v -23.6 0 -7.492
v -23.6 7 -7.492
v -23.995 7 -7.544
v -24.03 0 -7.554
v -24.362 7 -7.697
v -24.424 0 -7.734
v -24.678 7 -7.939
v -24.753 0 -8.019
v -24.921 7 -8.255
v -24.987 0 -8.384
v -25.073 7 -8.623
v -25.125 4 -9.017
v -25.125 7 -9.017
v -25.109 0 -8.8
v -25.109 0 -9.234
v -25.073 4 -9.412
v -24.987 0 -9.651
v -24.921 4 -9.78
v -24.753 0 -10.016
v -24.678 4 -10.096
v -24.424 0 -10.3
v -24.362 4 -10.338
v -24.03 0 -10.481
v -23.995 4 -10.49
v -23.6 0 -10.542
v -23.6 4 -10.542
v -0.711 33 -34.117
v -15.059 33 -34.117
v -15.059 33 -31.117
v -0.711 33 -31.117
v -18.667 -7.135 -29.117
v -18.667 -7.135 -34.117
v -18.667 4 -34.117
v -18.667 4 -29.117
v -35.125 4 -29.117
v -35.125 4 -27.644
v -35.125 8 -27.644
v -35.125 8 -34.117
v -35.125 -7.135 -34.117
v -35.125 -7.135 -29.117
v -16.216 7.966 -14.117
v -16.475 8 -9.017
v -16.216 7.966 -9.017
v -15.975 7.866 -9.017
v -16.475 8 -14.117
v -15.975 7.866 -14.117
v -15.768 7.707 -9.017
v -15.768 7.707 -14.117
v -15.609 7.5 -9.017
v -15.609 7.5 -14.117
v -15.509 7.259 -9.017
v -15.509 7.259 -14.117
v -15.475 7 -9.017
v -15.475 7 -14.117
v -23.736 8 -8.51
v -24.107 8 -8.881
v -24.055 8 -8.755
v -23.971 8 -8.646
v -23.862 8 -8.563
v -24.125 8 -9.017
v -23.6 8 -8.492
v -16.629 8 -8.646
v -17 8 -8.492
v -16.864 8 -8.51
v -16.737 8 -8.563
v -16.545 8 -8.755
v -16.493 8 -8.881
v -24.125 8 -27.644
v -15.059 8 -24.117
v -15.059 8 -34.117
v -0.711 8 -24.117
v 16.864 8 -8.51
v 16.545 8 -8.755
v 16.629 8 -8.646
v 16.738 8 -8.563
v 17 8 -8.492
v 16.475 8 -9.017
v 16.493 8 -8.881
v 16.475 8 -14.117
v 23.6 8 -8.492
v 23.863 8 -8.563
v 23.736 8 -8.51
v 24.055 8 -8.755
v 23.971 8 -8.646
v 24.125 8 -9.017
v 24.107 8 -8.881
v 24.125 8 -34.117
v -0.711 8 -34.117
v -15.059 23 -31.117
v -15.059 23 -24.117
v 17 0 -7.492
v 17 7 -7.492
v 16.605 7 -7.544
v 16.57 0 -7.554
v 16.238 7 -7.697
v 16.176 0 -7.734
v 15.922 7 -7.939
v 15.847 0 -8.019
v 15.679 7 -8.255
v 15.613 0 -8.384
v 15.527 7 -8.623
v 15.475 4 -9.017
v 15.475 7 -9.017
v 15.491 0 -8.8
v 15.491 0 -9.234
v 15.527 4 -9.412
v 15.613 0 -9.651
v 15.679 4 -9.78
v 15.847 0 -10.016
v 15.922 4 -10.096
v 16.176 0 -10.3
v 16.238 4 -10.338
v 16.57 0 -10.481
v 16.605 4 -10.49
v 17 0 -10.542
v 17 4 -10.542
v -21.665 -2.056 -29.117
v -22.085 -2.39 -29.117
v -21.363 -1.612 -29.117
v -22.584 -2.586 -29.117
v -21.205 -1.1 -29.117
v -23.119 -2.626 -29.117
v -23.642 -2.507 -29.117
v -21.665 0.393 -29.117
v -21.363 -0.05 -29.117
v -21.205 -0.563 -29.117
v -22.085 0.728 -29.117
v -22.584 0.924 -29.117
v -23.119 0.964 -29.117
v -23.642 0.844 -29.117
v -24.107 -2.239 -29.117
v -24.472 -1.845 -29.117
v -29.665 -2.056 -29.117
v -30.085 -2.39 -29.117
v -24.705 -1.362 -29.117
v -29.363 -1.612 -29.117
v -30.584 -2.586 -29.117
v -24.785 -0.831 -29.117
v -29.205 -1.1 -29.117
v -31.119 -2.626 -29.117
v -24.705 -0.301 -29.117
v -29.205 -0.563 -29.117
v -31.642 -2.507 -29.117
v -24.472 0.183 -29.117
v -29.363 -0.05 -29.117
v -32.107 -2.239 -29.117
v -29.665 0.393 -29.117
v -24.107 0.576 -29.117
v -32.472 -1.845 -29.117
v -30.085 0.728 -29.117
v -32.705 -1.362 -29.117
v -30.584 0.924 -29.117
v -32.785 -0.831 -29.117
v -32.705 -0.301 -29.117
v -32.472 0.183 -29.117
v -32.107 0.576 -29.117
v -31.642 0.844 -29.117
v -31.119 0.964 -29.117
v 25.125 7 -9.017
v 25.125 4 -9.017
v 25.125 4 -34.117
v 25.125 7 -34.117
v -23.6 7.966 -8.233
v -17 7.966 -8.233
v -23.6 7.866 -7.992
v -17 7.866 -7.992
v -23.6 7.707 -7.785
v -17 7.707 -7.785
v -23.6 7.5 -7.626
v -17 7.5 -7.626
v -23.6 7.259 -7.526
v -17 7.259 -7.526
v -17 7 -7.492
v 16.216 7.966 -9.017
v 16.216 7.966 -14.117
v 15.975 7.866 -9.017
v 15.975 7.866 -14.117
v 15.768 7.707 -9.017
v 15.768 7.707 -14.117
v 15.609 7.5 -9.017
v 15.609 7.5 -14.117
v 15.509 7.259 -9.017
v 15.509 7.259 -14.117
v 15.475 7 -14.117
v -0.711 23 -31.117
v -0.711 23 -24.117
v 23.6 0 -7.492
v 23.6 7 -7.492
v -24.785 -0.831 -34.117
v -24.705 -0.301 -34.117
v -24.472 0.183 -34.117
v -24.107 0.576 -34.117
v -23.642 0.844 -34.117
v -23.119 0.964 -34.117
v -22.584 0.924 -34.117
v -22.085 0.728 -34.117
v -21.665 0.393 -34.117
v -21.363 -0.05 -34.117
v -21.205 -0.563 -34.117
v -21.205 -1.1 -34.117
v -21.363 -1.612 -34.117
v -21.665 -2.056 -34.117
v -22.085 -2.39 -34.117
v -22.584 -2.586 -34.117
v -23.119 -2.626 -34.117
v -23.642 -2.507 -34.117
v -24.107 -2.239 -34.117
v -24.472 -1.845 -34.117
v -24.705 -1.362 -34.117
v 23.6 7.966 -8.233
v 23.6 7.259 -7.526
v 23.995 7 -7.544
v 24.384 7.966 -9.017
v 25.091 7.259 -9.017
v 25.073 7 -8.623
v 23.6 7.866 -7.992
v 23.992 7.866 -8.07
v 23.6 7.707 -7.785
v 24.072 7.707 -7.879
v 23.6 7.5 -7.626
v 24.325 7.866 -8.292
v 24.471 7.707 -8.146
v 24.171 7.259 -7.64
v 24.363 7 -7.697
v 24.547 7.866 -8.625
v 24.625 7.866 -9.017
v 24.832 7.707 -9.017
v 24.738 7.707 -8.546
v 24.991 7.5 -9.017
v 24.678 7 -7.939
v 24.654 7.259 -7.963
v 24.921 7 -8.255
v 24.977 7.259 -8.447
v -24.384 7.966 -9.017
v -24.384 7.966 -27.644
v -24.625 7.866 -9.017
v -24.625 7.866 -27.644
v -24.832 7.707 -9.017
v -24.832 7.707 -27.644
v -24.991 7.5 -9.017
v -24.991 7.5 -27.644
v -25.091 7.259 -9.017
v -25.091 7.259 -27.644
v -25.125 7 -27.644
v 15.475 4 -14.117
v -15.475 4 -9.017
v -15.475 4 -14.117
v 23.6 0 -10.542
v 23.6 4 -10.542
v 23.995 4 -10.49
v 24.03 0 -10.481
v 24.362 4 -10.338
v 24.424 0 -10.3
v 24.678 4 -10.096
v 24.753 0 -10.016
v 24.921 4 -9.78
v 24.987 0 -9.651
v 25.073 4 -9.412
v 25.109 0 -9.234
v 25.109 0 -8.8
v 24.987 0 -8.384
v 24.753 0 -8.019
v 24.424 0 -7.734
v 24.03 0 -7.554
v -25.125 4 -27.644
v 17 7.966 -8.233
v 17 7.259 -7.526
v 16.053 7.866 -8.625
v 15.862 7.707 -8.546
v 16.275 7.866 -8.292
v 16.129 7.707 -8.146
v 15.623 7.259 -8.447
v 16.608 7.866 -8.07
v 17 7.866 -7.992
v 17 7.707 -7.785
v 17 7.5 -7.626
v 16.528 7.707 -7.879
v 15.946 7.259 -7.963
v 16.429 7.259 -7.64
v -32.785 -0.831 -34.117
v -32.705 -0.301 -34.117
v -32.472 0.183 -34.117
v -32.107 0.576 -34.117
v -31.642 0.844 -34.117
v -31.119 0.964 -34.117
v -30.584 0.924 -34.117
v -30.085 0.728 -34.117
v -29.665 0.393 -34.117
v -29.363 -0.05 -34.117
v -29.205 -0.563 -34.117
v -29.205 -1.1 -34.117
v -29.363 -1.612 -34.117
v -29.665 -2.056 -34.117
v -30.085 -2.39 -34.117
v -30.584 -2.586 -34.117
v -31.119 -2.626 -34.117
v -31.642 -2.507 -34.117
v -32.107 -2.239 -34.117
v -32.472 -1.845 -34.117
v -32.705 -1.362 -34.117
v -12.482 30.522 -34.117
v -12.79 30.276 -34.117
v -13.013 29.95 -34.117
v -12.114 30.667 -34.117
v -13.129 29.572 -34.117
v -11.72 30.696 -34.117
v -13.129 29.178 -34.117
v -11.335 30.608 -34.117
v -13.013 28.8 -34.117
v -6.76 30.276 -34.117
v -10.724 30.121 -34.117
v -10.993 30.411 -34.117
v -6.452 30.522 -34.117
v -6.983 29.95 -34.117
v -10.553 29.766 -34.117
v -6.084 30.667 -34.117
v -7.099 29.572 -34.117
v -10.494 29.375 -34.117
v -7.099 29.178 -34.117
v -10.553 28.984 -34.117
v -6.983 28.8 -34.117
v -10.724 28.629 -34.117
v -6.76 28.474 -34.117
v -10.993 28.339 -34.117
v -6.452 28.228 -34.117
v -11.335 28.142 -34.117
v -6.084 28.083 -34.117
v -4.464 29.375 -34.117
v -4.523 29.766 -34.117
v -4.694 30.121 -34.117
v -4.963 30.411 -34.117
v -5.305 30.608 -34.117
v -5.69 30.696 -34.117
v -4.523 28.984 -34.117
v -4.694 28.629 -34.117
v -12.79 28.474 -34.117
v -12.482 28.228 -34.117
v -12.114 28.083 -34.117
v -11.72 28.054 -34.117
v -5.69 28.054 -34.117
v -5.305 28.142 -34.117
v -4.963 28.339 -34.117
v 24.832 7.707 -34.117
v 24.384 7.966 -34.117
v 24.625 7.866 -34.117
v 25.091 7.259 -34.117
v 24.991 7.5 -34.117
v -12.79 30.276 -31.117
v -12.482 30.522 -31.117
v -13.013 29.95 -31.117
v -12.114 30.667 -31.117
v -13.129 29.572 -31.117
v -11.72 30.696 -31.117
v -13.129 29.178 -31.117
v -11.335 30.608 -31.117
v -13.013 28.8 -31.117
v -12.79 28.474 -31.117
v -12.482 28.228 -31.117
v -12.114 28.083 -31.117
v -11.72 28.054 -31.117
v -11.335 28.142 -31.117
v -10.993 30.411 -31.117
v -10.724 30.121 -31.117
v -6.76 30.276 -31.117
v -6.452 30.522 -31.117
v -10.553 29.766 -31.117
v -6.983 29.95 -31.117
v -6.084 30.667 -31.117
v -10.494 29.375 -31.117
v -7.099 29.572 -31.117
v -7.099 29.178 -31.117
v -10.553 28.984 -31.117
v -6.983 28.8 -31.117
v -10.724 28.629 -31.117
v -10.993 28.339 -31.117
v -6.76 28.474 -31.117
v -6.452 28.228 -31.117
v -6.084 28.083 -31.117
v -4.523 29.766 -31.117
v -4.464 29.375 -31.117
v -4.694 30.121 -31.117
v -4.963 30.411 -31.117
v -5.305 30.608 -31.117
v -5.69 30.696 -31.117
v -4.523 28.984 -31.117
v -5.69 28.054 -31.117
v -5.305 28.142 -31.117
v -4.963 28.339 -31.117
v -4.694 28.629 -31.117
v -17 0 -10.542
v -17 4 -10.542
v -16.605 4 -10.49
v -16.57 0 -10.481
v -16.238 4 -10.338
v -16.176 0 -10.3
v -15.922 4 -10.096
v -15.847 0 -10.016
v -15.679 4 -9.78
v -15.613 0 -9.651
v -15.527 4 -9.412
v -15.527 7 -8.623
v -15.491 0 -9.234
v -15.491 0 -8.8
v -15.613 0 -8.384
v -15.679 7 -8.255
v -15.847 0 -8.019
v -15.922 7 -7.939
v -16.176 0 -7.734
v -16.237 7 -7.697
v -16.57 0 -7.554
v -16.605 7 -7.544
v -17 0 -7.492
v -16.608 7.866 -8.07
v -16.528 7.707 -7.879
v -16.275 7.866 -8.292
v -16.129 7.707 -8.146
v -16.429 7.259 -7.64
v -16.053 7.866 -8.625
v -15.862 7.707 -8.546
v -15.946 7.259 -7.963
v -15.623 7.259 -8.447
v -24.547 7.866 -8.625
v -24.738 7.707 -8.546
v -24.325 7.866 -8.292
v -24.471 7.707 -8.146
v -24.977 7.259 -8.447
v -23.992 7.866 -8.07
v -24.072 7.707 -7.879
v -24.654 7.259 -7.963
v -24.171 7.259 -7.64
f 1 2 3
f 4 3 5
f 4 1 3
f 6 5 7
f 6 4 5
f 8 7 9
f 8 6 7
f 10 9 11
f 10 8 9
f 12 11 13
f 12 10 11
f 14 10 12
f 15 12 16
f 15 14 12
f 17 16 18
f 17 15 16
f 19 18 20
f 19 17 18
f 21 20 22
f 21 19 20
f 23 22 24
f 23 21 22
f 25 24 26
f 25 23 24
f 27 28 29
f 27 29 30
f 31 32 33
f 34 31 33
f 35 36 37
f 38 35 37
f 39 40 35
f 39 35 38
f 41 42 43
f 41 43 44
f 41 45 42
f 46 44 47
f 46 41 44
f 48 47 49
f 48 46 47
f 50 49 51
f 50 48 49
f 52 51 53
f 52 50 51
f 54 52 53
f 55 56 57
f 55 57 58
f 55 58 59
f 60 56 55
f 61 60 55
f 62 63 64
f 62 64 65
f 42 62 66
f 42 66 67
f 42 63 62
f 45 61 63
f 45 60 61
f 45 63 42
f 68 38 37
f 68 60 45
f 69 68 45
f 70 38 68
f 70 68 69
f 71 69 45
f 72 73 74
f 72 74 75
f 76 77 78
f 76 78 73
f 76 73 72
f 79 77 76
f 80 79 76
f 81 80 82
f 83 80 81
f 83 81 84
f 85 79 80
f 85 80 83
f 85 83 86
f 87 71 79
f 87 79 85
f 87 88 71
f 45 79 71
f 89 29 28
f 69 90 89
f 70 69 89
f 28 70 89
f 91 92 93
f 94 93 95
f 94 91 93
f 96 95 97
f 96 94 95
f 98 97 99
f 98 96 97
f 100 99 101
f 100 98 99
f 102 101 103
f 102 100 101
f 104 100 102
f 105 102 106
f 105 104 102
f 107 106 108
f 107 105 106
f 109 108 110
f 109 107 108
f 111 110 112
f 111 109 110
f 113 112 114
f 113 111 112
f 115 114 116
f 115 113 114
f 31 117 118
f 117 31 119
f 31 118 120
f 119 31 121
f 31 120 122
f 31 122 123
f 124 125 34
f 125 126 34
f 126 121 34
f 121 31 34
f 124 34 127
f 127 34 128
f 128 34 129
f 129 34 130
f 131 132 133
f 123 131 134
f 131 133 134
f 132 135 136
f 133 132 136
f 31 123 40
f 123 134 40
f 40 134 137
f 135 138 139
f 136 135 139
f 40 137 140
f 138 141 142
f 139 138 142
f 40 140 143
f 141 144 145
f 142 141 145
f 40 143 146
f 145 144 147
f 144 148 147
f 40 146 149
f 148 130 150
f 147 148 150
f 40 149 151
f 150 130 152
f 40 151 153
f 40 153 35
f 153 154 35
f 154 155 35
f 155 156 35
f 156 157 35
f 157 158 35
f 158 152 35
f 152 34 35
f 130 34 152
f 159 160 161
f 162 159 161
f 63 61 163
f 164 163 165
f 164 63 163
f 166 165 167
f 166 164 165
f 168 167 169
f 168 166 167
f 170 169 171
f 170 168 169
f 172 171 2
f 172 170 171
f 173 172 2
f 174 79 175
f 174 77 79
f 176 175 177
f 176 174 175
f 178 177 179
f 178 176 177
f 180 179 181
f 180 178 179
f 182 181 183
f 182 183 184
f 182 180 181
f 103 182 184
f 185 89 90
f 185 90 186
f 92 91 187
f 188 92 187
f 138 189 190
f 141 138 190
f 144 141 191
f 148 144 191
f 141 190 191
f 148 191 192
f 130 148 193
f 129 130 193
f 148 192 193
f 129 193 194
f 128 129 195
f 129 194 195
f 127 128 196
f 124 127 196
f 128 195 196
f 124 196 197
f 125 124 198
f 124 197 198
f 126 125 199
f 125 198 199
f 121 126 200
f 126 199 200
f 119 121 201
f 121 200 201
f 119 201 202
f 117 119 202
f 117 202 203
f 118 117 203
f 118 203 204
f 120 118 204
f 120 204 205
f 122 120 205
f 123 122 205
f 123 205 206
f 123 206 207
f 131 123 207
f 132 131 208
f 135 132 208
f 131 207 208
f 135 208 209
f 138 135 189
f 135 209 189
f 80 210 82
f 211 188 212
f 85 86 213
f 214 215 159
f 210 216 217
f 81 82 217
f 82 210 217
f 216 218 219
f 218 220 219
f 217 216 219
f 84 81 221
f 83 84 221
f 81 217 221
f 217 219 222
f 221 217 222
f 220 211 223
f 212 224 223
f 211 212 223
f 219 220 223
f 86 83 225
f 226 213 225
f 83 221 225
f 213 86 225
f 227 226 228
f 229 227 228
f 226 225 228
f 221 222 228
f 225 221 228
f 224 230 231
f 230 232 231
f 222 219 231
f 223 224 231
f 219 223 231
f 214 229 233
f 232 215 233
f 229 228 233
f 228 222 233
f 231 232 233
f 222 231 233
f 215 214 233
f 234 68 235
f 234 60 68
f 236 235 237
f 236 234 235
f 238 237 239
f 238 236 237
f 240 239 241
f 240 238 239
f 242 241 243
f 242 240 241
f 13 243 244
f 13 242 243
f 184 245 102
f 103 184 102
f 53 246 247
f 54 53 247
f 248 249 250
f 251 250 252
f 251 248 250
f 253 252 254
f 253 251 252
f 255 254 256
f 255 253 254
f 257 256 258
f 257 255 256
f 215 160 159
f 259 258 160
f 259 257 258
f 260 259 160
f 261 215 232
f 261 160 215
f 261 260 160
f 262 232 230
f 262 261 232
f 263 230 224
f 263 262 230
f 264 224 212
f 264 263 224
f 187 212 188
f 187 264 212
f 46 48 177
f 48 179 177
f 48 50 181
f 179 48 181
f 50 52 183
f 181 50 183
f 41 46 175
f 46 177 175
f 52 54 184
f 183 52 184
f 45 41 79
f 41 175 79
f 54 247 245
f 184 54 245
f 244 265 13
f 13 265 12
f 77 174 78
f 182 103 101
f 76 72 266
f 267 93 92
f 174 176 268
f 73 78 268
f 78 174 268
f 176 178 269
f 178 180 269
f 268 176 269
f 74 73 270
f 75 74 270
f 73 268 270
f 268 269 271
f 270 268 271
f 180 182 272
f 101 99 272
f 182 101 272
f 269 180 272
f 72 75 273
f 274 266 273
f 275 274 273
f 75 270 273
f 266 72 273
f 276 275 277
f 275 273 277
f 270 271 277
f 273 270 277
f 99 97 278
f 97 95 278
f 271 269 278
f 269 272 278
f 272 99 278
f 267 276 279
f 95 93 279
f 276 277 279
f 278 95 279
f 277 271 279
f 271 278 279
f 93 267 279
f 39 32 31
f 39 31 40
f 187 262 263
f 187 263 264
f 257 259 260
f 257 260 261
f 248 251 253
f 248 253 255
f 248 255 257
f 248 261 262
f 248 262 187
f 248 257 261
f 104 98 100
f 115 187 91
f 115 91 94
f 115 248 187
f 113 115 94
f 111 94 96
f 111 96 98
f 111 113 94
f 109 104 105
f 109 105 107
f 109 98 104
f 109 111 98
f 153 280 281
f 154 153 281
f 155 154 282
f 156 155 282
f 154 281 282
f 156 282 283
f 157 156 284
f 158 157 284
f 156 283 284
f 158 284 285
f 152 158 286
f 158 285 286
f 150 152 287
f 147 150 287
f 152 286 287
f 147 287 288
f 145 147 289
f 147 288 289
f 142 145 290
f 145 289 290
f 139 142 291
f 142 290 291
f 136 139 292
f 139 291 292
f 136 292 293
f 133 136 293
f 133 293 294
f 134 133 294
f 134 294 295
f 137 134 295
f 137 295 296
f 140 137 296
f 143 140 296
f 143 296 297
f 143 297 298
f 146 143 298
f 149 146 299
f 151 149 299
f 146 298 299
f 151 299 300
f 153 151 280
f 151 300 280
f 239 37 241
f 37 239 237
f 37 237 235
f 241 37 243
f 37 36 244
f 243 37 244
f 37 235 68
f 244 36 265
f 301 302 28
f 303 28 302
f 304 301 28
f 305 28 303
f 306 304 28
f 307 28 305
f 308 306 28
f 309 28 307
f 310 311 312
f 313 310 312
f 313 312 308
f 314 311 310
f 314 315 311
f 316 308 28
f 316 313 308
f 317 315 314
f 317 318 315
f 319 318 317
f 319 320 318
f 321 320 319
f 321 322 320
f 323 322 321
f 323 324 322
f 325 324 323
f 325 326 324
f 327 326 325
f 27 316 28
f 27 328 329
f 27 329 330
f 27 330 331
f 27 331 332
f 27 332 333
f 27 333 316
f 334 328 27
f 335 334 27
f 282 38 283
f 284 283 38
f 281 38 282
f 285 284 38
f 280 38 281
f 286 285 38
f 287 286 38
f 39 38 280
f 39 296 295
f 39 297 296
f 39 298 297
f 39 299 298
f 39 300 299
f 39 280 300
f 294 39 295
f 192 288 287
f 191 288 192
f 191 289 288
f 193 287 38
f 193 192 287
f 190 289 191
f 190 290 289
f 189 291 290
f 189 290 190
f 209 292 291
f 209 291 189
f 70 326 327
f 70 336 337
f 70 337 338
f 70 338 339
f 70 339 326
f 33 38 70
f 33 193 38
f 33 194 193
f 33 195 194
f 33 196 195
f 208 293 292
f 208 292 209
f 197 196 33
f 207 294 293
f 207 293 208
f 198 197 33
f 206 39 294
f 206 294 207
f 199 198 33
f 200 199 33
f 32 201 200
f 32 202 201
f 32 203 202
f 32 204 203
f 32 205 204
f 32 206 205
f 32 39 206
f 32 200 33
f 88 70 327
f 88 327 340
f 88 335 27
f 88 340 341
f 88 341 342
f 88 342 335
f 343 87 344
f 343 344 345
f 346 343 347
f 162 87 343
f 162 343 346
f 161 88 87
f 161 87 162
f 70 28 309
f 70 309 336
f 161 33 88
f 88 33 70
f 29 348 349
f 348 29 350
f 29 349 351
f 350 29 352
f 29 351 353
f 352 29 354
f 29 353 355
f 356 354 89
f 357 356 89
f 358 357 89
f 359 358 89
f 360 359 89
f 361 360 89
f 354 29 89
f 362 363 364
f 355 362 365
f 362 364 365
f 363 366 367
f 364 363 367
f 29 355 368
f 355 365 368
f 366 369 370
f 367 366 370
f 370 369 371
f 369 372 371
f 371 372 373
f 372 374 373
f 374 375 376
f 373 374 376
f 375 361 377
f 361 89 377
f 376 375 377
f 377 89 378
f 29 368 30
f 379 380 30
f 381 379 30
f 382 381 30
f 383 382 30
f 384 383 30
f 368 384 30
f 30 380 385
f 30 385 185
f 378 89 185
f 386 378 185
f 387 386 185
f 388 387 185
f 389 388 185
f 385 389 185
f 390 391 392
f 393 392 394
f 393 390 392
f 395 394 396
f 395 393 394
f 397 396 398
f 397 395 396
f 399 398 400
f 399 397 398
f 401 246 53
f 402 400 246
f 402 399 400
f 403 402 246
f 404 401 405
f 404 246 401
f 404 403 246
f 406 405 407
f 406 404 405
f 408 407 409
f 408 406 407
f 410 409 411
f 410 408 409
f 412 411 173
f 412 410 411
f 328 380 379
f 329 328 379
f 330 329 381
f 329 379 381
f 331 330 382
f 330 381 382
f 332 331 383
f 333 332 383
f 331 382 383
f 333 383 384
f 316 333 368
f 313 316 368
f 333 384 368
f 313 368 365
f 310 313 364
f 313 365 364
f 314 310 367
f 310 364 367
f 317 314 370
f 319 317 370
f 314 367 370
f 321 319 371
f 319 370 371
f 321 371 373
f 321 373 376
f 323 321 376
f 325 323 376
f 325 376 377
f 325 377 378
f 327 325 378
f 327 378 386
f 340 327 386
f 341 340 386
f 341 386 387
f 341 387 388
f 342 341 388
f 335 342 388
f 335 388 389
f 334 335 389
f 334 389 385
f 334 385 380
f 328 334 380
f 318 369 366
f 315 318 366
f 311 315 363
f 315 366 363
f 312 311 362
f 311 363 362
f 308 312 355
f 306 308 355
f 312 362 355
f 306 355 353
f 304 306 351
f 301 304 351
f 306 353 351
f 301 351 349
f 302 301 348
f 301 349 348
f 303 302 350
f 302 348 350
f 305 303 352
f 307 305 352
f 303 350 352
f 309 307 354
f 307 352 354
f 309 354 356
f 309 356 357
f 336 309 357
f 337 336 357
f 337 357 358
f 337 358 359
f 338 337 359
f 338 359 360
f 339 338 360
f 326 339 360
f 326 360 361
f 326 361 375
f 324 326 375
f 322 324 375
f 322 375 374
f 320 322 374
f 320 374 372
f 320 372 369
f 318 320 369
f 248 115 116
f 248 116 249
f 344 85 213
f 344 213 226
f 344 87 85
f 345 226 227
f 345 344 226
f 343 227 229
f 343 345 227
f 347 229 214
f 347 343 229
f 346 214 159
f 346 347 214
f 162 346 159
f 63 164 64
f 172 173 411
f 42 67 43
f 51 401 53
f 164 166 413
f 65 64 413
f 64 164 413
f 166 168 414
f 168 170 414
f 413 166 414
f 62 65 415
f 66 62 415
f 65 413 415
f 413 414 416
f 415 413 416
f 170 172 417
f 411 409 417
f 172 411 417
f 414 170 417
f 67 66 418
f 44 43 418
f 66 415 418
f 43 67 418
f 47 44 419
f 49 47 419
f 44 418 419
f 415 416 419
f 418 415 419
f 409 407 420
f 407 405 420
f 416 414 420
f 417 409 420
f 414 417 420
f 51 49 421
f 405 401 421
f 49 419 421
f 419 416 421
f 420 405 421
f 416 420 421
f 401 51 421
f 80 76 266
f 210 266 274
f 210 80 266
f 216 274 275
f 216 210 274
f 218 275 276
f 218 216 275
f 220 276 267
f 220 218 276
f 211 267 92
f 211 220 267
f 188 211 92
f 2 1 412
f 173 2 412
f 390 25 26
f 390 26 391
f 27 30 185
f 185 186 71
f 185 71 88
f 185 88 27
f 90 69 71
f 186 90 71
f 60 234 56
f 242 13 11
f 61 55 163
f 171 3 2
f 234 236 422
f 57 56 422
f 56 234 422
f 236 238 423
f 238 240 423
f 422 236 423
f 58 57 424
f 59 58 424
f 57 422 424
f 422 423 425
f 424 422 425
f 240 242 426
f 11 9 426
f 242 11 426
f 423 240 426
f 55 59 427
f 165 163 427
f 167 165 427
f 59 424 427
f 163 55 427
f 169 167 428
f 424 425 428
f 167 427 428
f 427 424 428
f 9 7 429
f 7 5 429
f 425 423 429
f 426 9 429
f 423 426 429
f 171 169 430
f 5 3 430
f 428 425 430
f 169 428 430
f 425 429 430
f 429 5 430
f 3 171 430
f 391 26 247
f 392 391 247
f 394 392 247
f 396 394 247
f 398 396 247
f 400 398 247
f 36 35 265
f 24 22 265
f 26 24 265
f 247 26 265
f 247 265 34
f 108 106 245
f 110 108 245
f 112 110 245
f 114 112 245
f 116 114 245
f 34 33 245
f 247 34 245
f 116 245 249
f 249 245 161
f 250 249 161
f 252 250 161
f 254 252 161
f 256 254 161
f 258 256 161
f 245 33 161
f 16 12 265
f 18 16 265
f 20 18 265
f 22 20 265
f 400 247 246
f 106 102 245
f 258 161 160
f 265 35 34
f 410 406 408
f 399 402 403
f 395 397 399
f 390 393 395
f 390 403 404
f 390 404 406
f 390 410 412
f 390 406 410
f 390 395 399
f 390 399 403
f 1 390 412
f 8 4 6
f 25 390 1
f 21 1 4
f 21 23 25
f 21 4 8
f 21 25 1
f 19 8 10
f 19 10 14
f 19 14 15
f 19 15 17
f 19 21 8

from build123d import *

# Parameters (mm, degrees)
BOSS_EXTRUDE1_DEPTH   = 4
BOSS_EXTRUDE1_2_DEPTH = 4
SKETCH3_W             = 10
SKETCH3_H             = 6.473357475
SKETCH3_W_2           = 50.25
BOSS_EXTRUDE3_DEPTH   = 4
FILLET2_R             = 1
SKETCH4_W             = 14.347682942
SKETCH4_H             = 10
BOSS_EXTRUDE4_DEPTH   = 15
SKETCH6_W             = 14.347682942
SKETCH6_H             = 3
BOSS_EXTRUDE6_DEPTH   = 10
CUT_EXTRUDE1_REACH    = 55.674
SKETCH7_R             = 1.325
SKETCH8_W             = 16.45797352
SKETCH8_H             = 4
SKETCH8_H_2           = 11.134864375
SKETCH8_R             = 1.8
BOSS_EXTRUDE7_DEPTH   = 5


with BuildPart() as part:
    # Sketch1 → Boss-Extrude1 (new body)
    with BuildSketch(Plane(origin=(0, 0, 0), x_dir=(1, 0, 0), z_dir=(0, 1, 0))):
        with BuildLine():
            Line((-23.6, 10.542278437), (-17, 10.542278437))
            ThreePointArc((-17, 10.542278437), (-15.475, 9.017278437), (-17, 7.492278437))
            Line((-17, 7.492278437), (-23.6, 7.492278437))
            ThreePointArc((-23.6, 7.492278437), (-25.125, 9.017278437), (-23.6, 10.542278437))
        make_face()
    extrude(amount=BOSS_EXTRUDE1_DEPTH)



with BuildPart() as body_2:
    # Sketch1 → Boss-Extrude1 2 (new body)
    with BuildSketch(Plane(origin=(0, 0, 0), x_dir=(1, 0, 0), z_dir=(0, 1, 0))):
        with BuildLine():
            Line((23.6, 7.492278437), (17, 7.492278437))
            ThreePointArc((17, 7.492278437), (15.475, 9.017278437), (17, 10.542278437))
            Line((17, 10.542278437), (23.6, 10.542278437))
            ThreePointArc((23.6, 10.542278437), (25.125, 9.017278437), (23.6, 7.492278437))
        make_face()
    extrude(amount=BOSS_EXTRUDE1_2_DEPTH)


with BuildPart() as part_1:
    add(part.part)

    add(body_2.part)  # Boss-Extrude3 merges body 2
    # Sketch3 → Boss-Extrude3 (add)
    with BuildSketch(Plane(origin=(0, 4, 0), x_dir=(1, 0, 0), z_dir=(0, 1, 0))):
        with Locations((-30.125, 30.8805997)):
            Rectangle(SKETCH3_W, SKETCH3_H)
        with Locations((0, 30.8805997)):
            Rectangle(SKETCH3_W_2, SKETCH3_H)
        with BuildLine():
            Line((25.125, 27.643920962), (-25.125, 27.643920962))
            Line((-25.125, 27.643920962), (-25.125, 18.723444743))
            Line((-25.125, 18.723444743), (-25.125, 9.017278437))
            ThreePointArc((-25.125, 9.017278437), (-24.678337841, 7.938940596), (-23.6, 7.492278437))
            Line((-23.6, 7.492278437), (-17, 7.492278437))
            ThreePointArc((-17, 7.492278437), (-15.921662159, 7.938940596), (-15.475, 9.017278437))
            Line((-15.475, 9.017278437), (-15.475, 14.117278437))
            Line((-15.475, 14.117278437), (15.475, 14.117278437))
            Line((15.475, 14.117278437), (15.475, 9.017278437))
            ThreePointArc((15.475, 9.017278437), (15.921662159, 7.938940596), (17, 7.492278437))
            Line((17, 7.492278437), (23.6, 7.492278437))
            ThreePointArc((23.6, 7.492278437), (24.678337841, 7.938940596), (25.125, 9.017278437))
            Line((25.125, 9.017278437), (25.125, 18.723444743))
            Line((25.125, 18.723444743), (25.125, 27.643920962))
        make_face()
    extrude(amount=BOSS_EXTRUDE3_DEPTH)

    # Fillet2
    fillet2_edges = [part_1.edges().sort_by_distance(p)[0] for p in [
        (-25.125, 8, -18.3305997),
        (15.475, 8, -11.567278437),
        (-24.678337841, 8, -7.938940596),
        (-20.3, 8, -7.492278437),
        (-15.921662159, 8, -7.938940596),
        (-15.475, 8, -11.567278437),
        (15.921662159, 8, -7.938940596),
        (20.3, 8, -7.492278437),
        (24.678337841, 8, -7.938940596),
        (25.125, 8, -21.567278437),
    ]]
    fillet(fillet2_edges, radius=FILLET2_R)

    # Sketch4 → Boss-Extrude4 (add)
    with BuildSketch(Plane(origin=(0, 8, 0), x_dir=(1, 0, 0), z_dir=(0, 1, 0))):
        with Locations((-7.885296824, 29.117278437)):
            Rectangle(SKETCH4_W, SKETCH4_H)
    extrude(amount=BOSS_EXTRUDE4_DEPTH)

    # Sketch6 → Boss-Extrude6 (add)
    with BuildSketch(Plane(origin=(0, 23, 0), x_dir=(1, 0, 0), z_dir=(0, 1, 0))):
        with Locations((-7.885296824, 32.617278437)):
            Rectangle(SKETCH6_W, SKETCH6_H)
    extrude(amount=BOSS_EXTRUDE6_DEPTH)

    # Sketch7 → Cut-Extrude1 (cut, up to next)
    with BuildSketch(Plane.XY.offset(-31.117278437), mode=Mode.PRIVATE) as cut_extrude1_sk1:
        with Locations((-11.819138295, 29.375)):
            Circle(SKETCH7_R)
    cut_extrude1_tool1 = extrude(cut_extrude1_sk1.sketch, amount=-CUT_EXTRUDE1_REACH, mode=Mode.PRIVATE) & part_1.part
    # Sketch7 → Cut-Extrude1 (cut, up to next)
    with BuildSketch(Plane.XY.offset(-31.117278437), mode=Mode.PRIVATE) as cut_extrude1_sk2:
        with Locations((-5.789138295, 29.375)):
            Circle(SKETCH7_R)
    cut_extrude1_tool2 = extrude(cut_extrude1_sk2.sketch, amount=-CUT_EXTRUDE1_REACH, mode=Mode.PRIVATE) & part_1.part
    add(cut_extrude1_tool1.solids().sort_by_distance((-11.819138, 29.375, -31.117278))[0], mode=Mode.SUBTRACT)
    add(cut_extrude1_tool2.solids().sort_by_distance((-5.789138, 29.375, -31.117278))[0], mode=Mode.SUBTRACT)

    # Sketch8 → Boss-Extrude7 (add)
    # profile 1 of 2: a face of its own
    with BuildSketch(Plane(origin=(0, 0, -34.117278437), x_dir=(-1, 0, 0), z_dir=(0, 0, -1))):
        with Locations((26.89601324, 6)):
            Rectangle(SKETCH8_W, SKETCH8_H)
    # profile 2 of 2: a face of its own
    with BuildSketch(Plane(origin=(0, 0, -34.117278437), x_dir=(-1, 0, 0), z_dir=(0, 0, -1))):
        with Locations((26.89601324, -1.567432188)):
            Rectangle(SKETCH8_W, SKETCH8_H_2)
        with Locations((22.984760942, -0.83124894)):
            Circle(SKETCH8_R, mode=Mode.SUBTRACT)
        with Locations((30.984760942, -0.83124894)):
            Circle(SKETCH8_R, mode=Mode.SUBTRACT)
    extrude(amount=-BOSS_EXTRUDE7_DEPTH)


solid = part_1.part
